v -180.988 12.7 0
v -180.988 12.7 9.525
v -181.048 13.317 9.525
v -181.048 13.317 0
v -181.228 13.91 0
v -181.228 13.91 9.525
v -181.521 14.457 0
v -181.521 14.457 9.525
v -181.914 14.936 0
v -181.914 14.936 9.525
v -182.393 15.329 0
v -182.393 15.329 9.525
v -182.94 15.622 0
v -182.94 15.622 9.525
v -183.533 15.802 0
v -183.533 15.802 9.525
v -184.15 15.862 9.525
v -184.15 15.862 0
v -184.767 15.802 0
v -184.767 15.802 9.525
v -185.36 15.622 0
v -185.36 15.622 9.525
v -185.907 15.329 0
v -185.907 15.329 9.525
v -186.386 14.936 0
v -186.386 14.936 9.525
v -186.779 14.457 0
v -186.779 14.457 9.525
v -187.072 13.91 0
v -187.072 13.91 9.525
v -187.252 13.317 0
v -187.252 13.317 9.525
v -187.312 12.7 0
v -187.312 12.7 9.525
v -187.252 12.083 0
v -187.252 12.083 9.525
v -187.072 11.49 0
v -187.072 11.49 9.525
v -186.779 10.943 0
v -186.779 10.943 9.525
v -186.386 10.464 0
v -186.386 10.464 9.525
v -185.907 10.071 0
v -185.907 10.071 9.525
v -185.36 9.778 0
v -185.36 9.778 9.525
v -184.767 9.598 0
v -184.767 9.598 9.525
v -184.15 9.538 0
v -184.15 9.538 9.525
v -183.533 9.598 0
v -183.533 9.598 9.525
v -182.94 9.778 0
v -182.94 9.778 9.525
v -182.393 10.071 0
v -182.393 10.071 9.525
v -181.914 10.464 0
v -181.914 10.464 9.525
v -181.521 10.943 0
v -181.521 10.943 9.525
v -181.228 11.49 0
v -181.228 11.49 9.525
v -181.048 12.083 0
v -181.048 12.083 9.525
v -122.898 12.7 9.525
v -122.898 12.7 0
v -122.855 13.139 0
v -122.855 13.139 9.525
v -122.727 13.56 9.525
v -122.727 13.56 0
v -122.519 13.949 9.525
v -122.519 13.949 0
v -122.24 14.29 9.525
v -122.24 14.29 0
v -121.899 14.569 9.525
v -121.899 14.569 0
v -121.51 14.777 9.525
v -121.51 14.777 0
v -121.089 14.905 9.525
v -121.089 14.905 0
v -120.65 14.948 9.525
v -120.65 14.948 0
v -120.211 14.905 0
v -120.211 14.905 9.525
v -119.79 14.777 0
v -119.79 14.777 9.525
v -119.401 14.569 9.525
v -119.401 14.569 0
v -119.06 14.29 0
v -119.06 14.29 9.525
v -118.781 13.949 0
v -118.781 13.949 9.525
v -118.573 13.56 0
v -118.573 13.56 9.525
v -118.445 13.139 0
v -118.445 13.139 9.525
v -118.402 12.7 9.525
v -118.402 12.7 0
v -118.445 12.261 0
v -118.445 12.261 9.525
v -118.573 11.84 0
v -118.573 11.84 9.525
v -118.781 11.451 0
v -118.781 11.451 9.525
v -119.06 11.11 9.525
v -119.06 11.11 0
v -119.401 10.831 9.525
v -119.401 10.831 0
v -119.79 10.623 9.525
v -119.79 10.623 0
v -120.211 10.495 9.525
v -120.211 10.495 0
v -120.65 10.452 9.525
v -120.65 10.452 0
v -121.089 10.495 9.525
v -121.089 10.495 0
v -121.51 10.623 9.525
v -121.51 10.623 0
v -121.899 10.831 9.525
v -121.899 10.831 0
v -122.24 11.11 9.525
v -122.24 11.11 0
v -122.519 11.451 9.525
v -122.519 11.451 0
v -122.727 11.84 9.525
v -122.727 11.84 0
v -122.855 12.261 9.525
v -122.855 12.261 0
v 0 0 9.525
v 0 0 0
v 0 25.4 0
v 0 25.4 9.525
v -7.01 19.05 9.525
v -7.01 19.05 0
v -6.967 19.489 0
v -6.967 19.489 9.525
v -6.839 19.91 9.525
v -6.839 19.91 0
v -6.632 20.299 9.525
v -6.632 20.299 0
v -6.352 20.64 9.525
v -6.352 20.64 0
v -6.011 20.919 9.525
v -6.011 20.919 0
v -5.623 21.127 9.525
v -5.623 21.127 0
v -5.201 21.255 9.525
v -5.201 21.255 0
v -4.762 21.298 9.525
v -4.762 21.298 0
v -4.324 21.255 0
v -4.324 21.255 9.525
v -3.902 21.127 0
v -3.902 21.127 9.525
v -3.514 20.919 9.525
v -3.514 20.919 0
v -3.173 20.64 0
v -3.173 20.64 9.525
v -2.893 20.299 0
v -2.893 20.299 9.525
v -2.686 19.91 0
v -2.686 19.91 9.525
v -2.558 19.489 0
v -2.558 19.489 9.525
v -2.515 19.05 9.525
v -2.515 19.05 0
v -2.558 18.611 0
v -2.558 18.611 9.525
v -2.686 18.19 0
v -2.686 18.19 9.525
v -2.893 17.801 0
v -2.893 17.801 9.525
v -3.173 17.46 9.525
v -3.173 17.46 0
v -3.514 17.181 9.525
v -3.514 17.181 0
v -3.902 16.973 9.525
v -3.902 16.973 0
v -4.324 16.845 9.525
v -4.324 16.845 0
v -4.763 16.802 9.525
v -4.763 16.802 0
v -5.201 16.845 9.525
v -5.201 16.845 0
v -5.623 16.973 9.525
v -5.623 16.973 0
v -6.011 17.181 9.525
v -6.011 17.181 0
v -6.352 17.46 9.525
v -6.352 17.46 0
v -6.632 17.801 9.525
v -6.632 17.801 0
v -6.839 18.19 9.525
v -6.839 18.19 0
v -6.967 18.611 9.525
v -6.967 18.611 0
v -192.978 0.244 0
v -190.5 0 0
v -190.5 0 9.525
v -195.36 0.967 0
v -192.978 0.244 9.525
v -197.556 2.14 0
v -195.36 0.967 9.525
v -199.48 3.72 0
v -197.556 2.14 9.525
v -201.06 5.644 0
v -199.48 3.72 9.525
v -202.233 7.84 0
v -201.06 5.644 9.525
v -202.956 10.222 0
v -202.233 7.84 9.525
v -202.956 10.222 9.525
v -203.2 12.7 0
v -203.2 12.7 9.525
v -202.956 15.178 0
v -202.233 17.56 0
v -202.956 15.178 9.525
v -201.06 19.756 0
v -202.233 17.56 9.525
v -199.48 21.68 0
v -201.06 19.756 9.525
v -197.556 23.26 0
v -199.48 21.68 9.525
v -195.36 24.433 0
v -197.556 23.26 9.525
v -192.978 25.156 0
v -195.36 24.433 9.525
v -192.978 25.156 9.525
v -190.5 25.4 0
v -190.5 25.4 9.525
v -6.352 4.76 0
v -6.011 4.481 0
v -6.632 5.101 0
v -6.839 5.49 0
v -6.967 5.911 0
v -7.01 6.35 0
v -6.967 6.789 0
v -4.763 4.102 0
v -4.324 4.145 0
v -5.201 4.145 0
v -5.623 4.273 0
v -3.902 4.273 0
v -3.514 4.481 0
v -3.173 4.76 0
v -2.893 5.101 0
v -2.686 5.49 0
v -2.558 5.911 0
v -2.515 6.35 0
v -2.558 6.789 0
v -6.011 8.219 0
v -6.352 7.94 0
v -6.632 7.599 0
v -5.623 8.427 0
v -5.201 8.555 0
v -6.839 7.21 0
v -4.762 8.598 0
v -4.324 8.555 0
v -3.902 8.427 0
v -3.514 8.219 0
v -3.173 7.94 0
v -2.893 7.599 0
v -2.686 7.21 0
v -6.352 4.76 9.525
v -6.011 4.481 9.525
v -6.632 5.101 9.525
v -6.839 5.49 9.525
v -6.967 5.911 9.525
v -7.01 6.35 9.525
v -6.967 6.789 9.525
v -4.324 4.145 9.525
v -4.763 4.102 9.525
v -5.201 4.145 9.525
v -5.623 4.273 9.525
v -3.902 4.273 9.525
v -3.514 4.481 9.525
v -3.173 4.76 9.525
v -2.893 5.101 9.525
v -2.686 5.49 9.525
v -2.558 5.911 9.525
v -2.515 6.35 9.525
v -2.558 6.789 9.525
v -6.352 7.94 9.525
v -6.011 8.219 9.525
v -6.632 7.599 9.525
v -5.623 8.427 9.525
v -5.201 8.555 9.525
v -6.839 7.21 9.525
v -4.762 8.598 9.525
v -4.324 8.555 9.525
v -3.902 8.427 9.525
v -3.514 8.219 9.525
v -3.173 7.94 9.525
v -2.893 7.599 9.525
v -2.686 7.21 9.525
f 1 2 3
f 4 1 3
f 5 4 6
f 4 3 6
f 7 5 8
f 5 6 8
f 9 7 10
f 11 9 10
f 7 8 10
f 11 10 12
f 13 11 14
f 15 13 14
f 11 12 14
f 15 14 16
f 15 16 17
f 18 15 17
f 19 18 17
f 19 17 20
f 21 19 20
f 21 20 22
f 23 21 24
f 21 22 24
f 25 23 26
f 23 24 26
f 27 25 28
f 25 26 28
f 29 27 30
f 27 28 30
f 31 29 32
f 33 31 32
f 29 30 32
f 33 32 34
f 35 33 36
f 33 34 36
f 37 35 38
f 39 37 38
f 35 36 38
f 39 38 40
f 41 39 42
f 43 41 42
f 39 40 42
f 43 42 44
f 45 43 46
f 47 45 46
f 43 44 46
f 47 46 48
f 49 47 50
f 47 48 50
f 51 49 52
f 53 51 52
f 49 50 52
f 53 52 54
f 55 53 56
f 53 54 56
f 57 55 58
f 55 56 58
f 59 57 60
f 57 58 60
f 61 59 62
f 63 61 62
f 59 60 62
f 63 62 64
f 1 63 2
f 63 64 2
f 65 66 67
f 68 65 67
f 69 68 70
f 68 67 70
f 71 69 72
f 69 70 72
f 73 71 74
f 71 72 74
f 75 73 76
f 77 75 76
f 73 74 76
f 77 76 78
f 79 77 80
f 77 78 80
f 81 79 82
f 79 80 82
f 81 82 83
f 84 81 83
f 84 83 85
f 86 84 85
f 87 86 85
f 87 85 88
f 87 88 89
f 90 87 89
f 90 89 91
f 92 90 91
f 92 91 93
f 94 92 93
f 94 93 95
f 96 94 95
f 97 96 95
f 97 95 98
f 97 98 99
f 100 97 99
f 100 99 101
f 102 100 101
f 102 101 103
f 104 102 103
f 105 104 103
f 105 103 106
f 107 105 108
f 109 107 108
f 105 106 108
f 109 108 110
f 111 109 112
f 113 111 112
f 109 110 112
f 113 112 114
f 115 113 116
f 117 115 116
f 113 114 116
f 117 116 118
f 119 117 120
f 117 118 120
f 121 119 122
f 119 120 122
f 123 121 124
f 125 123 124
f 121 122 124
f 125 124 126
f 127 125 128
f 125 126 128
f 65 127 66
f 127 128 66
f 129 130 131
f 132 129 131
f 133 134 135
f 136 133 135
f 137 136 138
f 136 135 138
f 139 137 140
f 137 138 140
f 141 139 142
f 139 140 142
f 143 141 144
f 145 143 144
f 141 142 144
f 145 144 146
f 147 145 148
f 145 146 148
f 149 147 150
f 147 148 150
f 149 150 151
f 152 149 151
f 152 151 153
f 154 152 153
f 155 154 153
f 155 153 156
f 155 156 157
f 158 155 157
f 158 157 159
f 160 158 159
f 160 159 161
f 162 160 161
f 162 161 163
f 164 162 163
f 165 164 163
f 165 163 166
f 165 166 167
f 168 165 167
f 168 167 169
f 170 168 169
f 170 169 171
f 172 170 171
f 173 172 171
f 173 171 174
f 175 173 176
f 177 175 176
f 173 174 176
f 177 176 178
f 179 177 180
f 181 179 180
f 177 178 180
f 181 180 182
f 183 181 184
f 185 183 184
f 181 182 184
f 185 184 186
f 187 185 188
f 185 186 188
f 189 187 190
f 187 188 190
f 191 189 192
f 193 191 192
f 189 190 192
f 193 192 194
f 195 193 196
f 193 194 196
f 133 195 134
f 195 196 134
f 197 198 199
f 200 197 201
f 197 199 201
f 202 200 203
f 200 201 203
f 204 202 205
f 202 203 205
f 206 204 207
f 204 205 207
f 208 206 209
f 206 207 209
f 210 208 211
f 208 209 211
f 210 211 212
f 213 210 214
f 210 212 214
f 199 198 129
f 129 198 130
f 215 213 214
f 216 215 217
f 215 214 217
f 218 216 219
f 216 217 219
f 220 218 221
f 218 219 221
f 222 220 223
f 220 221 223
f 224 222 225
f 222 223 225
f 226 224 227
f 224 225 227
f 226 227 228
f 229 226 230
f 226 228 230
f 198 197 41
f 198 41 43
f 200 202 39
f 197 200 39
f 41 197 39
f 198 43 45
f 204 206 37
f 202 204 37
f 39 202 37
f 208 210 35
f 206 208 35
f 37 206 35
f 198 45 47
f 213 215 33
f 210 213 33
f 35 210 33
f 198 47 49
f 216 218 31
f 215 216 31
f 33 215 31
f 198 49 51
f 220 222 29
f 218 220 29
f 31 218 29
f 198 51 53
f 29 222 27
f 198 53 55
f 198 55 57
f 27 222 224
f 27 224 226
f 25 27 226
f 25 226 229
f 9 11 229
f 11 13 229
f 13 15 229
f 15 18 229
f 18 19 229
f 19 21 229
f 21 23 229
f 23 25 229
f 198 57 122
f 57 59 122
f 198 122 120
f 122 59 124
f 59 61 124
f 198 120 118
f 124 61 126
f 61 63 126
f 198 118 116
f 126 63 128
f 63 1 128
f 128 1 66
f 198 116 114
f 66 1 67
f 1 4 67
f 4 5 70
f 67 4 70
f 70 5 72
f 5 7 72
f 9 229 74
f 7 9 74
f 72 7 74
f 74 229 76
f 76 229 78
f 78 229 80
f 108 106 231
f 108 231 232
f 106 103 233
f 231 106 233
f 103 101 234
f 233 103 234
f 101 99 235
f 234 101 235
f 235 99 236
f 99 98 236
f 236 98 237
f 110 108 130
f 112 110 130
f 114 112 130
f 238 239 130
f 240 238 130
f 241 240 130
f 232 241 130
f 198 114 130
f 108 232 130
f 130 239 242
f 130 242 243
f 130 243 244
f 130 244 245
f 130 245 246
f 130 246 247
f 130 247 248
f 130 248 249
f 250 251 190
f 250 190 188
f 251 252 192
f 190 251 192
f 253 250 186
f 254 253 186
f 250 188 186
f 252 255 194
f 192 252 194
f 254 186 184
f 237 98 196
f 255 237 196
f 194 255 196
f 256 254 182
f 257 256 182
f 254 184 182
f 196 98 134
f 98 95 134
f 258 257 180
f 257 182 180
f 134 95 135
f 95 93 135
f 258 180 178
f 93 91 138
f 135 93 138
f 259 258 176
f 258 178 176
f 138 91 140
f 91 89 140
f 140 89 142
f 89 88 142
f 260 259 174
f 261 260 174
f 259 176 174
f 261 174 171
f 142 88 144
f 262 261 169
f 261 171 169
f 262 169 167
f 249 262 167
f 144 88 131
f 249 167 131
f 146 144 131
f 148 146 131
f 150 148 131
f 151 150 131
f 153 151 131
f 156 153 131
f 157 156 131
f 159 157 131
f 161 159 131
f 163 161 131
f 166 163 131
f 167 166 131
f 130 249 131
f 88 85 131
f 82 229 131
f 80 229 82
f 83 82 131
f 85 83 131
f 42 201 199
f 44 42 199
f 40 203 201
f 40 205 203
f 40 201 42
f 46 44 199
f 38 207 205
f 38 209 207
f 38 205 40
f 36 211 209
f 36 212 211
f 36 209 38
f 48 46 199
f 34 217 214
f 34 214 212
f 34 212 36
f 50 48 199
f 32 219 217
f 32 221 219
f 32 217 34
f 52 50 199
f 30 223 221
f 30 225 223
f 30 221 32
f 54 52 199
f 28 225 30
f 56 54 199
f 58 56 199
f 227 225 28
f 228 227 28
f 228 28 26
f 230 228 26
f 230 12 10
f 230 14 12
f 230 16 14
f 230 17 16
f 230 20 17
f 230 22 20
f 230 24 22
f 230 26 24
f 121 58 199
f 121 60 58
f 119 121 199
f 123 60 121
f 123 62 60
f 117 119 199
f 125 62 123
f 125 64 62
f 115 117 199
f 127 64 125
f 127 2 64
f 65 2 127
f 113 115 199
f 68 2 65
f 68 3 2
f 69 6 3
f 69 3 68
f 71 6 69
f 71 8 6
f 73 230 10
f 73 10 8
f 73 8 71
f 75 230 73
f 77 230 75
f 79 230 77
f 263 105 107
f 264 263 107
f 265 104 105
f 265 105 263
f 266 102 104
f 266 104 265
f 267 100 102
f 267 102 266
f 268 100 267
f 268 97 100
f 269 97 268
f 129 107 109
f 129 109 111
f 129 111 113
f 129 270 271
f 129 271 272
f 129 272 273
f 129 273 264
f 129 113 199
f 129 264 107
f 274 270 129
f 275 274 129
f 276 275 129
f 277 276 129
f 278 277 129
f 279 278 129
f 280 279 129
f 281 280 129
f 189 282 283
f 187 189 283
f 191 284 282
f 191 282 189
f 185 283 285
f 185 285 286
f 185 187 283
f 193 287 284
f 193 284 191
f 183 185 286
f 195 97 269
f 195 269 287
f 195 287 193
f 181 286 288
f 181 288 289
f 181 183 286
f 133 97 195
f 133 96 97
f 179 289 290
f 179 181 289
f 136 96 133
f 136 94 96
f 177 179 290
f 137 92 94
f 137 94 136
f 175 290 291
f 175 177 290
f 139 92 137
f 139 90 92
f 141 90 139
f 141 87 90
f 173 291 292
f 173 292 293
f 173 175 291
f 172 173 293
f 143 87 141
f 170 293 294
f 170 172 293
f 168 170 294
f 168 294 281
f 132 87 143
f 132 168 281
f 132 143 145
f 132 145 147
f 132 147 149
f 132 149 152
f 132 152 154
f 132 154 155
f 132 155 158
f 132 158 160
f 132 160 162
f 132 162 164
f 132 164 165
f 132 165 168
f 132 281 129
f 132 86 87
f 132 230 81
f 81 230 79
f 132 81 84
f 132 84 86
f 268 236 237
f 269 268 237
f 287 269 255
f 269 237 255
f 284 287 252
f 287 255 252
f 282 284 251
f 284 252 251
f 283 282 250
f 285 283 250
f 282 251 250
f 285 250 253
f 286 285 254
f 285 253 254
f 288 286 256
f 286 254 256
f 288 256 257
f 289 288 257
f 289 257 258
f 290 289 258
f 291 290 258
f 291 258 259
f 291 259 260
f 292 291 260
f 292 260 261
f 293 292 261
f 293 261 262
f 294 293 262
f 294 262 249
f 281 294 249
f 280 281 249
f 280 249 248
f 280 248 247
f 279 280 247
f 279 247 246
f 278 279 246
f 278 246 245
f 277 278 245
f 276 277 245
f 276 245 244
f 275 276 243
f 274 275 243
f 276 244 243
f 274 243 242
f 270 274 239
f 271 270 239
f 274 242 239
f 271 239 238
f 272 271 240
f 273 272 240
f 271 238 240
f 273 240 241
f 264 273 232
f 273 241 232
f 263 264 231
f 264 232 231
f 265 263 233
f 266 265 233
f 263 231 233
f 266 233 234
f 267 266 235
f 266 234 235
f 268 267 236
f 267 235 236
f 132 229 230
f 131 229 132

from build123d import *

# Parameters (mm, degrees)
SKETCH1_W                 = 203.2
SKETCH1_H                 = 25.4
BOSS_EXTRUDE1_DEPTH       = 9.525
F_8_CLEARANCE_HOLE1_D     = 4.4958
F_8_CLEARANCE_HOLE1_DEPTH = 25.4
F_8_CLEARANCE_HOLE1_TIP   = 1.350674586
SKETCH5_R                 = 3.1623
CUT_EXTRUDE1_DEPTH        = 9.525
F_8_CLEARANCE_HOLE2_D     = 4.4958
F_8_CLEARANCE_HOLE2_DEPTH = 19.05
F_8_CLEARANCE_HOLE2_TIP   = 1.350674586
CUT_EXTRUDE2_DEPTH        = 10.525


with BuildPart() as part:
    # Sketch1 → Boss-Extrude1 (new body)
    with BuildSketch(Plane.XY):
        with Locations((-101.6, 12.7)):
            Rectangle(SKETCH1_W, SKETCH1_H)
    extrude(amount=BOSS_EXTRUDE1_DEPTH)

    # #8 Clearance Hole1
    with Locations(Plane.XY.offset(9.525)):
        with Locations((-4.7625, 6.35), (-4.7625, 19.05)):
            Hole(F_8_CLEARANCE_HOLE1_D / 2, depth=F_8_CLEARANCE_HOLE1_DEPTH)
            with Locations((0, 0, -(F_8_CLEARANCE_HOLE1_DEPTH + F_8_CLEARANCE_HOLE1_TIP / 2))):  # 118° drill point
                Cone(0, F_8_CLEARANCE_HOLE1_D / 2, F_8_CLEARANCE_HOLE1_TIP, mode=Mode.SUBTRACT)

    # Sketch5 → Cut-Extrude1 (cut)
    with BuildSketch(Plane.XY.offset(9.525)):
        with Locations((-184.15, 12.7)):
            Circle(SKETCH5_R)
    extrude(amount=-CUT_EXTRUDE1_DEPTH, mode=Mode.SUBTRACT)

    # #8 Clearance Hole2
    with Locations(Plane.XY.offset(9.525)):
        with Locations((-120.65, 12.7)):
            Hole(F_8_CLEARANCE_HOLE2_D / 2, depth=F_8_CLEARANCE_HOLE2_DEPTH)
            with Locations((0, 0, -(F_8_CLEARANCE_HOLE2_DEPTH + F_8_CLEARANCE_HOLE2_TIP / 2))):  # 118° drill point
                Cone(0, F_8_CLEARANCE_HOLE2_D / 2, F_8_CLEARANCE_HOLE2_TIP, mode=Mode.SUBTRACT)

    # Sketch10 → Cut-Extrude2 (cut, through all)
    with BuildSketch(Plane.XY.offset(9.525)):
        with BuildLine():
            Line((-190.5, 25.4), (-203.2, 25.4))
            Line((-203.2, 25.4), (-203.2, 12.7))
            ThreePointArc((-203.2, 12.7), (-199.480256121, 21.680256121), (-190.5, 25.4))
        make_face()
        with BuildLine():
            ThreePointArc((-190.5, 0), (-199.480256121, 3.719743879), (-203.2, 12.7))
            Line((-203.2, 12.7), (-203.2, 0))
            Line((-203.2, 0), (-190.5, 0))
        make_face()
    extrude(amount=-CUT_EXTRUDE2_DEPTH, mode=Mode.SUBTRACT)


solid = part.part
